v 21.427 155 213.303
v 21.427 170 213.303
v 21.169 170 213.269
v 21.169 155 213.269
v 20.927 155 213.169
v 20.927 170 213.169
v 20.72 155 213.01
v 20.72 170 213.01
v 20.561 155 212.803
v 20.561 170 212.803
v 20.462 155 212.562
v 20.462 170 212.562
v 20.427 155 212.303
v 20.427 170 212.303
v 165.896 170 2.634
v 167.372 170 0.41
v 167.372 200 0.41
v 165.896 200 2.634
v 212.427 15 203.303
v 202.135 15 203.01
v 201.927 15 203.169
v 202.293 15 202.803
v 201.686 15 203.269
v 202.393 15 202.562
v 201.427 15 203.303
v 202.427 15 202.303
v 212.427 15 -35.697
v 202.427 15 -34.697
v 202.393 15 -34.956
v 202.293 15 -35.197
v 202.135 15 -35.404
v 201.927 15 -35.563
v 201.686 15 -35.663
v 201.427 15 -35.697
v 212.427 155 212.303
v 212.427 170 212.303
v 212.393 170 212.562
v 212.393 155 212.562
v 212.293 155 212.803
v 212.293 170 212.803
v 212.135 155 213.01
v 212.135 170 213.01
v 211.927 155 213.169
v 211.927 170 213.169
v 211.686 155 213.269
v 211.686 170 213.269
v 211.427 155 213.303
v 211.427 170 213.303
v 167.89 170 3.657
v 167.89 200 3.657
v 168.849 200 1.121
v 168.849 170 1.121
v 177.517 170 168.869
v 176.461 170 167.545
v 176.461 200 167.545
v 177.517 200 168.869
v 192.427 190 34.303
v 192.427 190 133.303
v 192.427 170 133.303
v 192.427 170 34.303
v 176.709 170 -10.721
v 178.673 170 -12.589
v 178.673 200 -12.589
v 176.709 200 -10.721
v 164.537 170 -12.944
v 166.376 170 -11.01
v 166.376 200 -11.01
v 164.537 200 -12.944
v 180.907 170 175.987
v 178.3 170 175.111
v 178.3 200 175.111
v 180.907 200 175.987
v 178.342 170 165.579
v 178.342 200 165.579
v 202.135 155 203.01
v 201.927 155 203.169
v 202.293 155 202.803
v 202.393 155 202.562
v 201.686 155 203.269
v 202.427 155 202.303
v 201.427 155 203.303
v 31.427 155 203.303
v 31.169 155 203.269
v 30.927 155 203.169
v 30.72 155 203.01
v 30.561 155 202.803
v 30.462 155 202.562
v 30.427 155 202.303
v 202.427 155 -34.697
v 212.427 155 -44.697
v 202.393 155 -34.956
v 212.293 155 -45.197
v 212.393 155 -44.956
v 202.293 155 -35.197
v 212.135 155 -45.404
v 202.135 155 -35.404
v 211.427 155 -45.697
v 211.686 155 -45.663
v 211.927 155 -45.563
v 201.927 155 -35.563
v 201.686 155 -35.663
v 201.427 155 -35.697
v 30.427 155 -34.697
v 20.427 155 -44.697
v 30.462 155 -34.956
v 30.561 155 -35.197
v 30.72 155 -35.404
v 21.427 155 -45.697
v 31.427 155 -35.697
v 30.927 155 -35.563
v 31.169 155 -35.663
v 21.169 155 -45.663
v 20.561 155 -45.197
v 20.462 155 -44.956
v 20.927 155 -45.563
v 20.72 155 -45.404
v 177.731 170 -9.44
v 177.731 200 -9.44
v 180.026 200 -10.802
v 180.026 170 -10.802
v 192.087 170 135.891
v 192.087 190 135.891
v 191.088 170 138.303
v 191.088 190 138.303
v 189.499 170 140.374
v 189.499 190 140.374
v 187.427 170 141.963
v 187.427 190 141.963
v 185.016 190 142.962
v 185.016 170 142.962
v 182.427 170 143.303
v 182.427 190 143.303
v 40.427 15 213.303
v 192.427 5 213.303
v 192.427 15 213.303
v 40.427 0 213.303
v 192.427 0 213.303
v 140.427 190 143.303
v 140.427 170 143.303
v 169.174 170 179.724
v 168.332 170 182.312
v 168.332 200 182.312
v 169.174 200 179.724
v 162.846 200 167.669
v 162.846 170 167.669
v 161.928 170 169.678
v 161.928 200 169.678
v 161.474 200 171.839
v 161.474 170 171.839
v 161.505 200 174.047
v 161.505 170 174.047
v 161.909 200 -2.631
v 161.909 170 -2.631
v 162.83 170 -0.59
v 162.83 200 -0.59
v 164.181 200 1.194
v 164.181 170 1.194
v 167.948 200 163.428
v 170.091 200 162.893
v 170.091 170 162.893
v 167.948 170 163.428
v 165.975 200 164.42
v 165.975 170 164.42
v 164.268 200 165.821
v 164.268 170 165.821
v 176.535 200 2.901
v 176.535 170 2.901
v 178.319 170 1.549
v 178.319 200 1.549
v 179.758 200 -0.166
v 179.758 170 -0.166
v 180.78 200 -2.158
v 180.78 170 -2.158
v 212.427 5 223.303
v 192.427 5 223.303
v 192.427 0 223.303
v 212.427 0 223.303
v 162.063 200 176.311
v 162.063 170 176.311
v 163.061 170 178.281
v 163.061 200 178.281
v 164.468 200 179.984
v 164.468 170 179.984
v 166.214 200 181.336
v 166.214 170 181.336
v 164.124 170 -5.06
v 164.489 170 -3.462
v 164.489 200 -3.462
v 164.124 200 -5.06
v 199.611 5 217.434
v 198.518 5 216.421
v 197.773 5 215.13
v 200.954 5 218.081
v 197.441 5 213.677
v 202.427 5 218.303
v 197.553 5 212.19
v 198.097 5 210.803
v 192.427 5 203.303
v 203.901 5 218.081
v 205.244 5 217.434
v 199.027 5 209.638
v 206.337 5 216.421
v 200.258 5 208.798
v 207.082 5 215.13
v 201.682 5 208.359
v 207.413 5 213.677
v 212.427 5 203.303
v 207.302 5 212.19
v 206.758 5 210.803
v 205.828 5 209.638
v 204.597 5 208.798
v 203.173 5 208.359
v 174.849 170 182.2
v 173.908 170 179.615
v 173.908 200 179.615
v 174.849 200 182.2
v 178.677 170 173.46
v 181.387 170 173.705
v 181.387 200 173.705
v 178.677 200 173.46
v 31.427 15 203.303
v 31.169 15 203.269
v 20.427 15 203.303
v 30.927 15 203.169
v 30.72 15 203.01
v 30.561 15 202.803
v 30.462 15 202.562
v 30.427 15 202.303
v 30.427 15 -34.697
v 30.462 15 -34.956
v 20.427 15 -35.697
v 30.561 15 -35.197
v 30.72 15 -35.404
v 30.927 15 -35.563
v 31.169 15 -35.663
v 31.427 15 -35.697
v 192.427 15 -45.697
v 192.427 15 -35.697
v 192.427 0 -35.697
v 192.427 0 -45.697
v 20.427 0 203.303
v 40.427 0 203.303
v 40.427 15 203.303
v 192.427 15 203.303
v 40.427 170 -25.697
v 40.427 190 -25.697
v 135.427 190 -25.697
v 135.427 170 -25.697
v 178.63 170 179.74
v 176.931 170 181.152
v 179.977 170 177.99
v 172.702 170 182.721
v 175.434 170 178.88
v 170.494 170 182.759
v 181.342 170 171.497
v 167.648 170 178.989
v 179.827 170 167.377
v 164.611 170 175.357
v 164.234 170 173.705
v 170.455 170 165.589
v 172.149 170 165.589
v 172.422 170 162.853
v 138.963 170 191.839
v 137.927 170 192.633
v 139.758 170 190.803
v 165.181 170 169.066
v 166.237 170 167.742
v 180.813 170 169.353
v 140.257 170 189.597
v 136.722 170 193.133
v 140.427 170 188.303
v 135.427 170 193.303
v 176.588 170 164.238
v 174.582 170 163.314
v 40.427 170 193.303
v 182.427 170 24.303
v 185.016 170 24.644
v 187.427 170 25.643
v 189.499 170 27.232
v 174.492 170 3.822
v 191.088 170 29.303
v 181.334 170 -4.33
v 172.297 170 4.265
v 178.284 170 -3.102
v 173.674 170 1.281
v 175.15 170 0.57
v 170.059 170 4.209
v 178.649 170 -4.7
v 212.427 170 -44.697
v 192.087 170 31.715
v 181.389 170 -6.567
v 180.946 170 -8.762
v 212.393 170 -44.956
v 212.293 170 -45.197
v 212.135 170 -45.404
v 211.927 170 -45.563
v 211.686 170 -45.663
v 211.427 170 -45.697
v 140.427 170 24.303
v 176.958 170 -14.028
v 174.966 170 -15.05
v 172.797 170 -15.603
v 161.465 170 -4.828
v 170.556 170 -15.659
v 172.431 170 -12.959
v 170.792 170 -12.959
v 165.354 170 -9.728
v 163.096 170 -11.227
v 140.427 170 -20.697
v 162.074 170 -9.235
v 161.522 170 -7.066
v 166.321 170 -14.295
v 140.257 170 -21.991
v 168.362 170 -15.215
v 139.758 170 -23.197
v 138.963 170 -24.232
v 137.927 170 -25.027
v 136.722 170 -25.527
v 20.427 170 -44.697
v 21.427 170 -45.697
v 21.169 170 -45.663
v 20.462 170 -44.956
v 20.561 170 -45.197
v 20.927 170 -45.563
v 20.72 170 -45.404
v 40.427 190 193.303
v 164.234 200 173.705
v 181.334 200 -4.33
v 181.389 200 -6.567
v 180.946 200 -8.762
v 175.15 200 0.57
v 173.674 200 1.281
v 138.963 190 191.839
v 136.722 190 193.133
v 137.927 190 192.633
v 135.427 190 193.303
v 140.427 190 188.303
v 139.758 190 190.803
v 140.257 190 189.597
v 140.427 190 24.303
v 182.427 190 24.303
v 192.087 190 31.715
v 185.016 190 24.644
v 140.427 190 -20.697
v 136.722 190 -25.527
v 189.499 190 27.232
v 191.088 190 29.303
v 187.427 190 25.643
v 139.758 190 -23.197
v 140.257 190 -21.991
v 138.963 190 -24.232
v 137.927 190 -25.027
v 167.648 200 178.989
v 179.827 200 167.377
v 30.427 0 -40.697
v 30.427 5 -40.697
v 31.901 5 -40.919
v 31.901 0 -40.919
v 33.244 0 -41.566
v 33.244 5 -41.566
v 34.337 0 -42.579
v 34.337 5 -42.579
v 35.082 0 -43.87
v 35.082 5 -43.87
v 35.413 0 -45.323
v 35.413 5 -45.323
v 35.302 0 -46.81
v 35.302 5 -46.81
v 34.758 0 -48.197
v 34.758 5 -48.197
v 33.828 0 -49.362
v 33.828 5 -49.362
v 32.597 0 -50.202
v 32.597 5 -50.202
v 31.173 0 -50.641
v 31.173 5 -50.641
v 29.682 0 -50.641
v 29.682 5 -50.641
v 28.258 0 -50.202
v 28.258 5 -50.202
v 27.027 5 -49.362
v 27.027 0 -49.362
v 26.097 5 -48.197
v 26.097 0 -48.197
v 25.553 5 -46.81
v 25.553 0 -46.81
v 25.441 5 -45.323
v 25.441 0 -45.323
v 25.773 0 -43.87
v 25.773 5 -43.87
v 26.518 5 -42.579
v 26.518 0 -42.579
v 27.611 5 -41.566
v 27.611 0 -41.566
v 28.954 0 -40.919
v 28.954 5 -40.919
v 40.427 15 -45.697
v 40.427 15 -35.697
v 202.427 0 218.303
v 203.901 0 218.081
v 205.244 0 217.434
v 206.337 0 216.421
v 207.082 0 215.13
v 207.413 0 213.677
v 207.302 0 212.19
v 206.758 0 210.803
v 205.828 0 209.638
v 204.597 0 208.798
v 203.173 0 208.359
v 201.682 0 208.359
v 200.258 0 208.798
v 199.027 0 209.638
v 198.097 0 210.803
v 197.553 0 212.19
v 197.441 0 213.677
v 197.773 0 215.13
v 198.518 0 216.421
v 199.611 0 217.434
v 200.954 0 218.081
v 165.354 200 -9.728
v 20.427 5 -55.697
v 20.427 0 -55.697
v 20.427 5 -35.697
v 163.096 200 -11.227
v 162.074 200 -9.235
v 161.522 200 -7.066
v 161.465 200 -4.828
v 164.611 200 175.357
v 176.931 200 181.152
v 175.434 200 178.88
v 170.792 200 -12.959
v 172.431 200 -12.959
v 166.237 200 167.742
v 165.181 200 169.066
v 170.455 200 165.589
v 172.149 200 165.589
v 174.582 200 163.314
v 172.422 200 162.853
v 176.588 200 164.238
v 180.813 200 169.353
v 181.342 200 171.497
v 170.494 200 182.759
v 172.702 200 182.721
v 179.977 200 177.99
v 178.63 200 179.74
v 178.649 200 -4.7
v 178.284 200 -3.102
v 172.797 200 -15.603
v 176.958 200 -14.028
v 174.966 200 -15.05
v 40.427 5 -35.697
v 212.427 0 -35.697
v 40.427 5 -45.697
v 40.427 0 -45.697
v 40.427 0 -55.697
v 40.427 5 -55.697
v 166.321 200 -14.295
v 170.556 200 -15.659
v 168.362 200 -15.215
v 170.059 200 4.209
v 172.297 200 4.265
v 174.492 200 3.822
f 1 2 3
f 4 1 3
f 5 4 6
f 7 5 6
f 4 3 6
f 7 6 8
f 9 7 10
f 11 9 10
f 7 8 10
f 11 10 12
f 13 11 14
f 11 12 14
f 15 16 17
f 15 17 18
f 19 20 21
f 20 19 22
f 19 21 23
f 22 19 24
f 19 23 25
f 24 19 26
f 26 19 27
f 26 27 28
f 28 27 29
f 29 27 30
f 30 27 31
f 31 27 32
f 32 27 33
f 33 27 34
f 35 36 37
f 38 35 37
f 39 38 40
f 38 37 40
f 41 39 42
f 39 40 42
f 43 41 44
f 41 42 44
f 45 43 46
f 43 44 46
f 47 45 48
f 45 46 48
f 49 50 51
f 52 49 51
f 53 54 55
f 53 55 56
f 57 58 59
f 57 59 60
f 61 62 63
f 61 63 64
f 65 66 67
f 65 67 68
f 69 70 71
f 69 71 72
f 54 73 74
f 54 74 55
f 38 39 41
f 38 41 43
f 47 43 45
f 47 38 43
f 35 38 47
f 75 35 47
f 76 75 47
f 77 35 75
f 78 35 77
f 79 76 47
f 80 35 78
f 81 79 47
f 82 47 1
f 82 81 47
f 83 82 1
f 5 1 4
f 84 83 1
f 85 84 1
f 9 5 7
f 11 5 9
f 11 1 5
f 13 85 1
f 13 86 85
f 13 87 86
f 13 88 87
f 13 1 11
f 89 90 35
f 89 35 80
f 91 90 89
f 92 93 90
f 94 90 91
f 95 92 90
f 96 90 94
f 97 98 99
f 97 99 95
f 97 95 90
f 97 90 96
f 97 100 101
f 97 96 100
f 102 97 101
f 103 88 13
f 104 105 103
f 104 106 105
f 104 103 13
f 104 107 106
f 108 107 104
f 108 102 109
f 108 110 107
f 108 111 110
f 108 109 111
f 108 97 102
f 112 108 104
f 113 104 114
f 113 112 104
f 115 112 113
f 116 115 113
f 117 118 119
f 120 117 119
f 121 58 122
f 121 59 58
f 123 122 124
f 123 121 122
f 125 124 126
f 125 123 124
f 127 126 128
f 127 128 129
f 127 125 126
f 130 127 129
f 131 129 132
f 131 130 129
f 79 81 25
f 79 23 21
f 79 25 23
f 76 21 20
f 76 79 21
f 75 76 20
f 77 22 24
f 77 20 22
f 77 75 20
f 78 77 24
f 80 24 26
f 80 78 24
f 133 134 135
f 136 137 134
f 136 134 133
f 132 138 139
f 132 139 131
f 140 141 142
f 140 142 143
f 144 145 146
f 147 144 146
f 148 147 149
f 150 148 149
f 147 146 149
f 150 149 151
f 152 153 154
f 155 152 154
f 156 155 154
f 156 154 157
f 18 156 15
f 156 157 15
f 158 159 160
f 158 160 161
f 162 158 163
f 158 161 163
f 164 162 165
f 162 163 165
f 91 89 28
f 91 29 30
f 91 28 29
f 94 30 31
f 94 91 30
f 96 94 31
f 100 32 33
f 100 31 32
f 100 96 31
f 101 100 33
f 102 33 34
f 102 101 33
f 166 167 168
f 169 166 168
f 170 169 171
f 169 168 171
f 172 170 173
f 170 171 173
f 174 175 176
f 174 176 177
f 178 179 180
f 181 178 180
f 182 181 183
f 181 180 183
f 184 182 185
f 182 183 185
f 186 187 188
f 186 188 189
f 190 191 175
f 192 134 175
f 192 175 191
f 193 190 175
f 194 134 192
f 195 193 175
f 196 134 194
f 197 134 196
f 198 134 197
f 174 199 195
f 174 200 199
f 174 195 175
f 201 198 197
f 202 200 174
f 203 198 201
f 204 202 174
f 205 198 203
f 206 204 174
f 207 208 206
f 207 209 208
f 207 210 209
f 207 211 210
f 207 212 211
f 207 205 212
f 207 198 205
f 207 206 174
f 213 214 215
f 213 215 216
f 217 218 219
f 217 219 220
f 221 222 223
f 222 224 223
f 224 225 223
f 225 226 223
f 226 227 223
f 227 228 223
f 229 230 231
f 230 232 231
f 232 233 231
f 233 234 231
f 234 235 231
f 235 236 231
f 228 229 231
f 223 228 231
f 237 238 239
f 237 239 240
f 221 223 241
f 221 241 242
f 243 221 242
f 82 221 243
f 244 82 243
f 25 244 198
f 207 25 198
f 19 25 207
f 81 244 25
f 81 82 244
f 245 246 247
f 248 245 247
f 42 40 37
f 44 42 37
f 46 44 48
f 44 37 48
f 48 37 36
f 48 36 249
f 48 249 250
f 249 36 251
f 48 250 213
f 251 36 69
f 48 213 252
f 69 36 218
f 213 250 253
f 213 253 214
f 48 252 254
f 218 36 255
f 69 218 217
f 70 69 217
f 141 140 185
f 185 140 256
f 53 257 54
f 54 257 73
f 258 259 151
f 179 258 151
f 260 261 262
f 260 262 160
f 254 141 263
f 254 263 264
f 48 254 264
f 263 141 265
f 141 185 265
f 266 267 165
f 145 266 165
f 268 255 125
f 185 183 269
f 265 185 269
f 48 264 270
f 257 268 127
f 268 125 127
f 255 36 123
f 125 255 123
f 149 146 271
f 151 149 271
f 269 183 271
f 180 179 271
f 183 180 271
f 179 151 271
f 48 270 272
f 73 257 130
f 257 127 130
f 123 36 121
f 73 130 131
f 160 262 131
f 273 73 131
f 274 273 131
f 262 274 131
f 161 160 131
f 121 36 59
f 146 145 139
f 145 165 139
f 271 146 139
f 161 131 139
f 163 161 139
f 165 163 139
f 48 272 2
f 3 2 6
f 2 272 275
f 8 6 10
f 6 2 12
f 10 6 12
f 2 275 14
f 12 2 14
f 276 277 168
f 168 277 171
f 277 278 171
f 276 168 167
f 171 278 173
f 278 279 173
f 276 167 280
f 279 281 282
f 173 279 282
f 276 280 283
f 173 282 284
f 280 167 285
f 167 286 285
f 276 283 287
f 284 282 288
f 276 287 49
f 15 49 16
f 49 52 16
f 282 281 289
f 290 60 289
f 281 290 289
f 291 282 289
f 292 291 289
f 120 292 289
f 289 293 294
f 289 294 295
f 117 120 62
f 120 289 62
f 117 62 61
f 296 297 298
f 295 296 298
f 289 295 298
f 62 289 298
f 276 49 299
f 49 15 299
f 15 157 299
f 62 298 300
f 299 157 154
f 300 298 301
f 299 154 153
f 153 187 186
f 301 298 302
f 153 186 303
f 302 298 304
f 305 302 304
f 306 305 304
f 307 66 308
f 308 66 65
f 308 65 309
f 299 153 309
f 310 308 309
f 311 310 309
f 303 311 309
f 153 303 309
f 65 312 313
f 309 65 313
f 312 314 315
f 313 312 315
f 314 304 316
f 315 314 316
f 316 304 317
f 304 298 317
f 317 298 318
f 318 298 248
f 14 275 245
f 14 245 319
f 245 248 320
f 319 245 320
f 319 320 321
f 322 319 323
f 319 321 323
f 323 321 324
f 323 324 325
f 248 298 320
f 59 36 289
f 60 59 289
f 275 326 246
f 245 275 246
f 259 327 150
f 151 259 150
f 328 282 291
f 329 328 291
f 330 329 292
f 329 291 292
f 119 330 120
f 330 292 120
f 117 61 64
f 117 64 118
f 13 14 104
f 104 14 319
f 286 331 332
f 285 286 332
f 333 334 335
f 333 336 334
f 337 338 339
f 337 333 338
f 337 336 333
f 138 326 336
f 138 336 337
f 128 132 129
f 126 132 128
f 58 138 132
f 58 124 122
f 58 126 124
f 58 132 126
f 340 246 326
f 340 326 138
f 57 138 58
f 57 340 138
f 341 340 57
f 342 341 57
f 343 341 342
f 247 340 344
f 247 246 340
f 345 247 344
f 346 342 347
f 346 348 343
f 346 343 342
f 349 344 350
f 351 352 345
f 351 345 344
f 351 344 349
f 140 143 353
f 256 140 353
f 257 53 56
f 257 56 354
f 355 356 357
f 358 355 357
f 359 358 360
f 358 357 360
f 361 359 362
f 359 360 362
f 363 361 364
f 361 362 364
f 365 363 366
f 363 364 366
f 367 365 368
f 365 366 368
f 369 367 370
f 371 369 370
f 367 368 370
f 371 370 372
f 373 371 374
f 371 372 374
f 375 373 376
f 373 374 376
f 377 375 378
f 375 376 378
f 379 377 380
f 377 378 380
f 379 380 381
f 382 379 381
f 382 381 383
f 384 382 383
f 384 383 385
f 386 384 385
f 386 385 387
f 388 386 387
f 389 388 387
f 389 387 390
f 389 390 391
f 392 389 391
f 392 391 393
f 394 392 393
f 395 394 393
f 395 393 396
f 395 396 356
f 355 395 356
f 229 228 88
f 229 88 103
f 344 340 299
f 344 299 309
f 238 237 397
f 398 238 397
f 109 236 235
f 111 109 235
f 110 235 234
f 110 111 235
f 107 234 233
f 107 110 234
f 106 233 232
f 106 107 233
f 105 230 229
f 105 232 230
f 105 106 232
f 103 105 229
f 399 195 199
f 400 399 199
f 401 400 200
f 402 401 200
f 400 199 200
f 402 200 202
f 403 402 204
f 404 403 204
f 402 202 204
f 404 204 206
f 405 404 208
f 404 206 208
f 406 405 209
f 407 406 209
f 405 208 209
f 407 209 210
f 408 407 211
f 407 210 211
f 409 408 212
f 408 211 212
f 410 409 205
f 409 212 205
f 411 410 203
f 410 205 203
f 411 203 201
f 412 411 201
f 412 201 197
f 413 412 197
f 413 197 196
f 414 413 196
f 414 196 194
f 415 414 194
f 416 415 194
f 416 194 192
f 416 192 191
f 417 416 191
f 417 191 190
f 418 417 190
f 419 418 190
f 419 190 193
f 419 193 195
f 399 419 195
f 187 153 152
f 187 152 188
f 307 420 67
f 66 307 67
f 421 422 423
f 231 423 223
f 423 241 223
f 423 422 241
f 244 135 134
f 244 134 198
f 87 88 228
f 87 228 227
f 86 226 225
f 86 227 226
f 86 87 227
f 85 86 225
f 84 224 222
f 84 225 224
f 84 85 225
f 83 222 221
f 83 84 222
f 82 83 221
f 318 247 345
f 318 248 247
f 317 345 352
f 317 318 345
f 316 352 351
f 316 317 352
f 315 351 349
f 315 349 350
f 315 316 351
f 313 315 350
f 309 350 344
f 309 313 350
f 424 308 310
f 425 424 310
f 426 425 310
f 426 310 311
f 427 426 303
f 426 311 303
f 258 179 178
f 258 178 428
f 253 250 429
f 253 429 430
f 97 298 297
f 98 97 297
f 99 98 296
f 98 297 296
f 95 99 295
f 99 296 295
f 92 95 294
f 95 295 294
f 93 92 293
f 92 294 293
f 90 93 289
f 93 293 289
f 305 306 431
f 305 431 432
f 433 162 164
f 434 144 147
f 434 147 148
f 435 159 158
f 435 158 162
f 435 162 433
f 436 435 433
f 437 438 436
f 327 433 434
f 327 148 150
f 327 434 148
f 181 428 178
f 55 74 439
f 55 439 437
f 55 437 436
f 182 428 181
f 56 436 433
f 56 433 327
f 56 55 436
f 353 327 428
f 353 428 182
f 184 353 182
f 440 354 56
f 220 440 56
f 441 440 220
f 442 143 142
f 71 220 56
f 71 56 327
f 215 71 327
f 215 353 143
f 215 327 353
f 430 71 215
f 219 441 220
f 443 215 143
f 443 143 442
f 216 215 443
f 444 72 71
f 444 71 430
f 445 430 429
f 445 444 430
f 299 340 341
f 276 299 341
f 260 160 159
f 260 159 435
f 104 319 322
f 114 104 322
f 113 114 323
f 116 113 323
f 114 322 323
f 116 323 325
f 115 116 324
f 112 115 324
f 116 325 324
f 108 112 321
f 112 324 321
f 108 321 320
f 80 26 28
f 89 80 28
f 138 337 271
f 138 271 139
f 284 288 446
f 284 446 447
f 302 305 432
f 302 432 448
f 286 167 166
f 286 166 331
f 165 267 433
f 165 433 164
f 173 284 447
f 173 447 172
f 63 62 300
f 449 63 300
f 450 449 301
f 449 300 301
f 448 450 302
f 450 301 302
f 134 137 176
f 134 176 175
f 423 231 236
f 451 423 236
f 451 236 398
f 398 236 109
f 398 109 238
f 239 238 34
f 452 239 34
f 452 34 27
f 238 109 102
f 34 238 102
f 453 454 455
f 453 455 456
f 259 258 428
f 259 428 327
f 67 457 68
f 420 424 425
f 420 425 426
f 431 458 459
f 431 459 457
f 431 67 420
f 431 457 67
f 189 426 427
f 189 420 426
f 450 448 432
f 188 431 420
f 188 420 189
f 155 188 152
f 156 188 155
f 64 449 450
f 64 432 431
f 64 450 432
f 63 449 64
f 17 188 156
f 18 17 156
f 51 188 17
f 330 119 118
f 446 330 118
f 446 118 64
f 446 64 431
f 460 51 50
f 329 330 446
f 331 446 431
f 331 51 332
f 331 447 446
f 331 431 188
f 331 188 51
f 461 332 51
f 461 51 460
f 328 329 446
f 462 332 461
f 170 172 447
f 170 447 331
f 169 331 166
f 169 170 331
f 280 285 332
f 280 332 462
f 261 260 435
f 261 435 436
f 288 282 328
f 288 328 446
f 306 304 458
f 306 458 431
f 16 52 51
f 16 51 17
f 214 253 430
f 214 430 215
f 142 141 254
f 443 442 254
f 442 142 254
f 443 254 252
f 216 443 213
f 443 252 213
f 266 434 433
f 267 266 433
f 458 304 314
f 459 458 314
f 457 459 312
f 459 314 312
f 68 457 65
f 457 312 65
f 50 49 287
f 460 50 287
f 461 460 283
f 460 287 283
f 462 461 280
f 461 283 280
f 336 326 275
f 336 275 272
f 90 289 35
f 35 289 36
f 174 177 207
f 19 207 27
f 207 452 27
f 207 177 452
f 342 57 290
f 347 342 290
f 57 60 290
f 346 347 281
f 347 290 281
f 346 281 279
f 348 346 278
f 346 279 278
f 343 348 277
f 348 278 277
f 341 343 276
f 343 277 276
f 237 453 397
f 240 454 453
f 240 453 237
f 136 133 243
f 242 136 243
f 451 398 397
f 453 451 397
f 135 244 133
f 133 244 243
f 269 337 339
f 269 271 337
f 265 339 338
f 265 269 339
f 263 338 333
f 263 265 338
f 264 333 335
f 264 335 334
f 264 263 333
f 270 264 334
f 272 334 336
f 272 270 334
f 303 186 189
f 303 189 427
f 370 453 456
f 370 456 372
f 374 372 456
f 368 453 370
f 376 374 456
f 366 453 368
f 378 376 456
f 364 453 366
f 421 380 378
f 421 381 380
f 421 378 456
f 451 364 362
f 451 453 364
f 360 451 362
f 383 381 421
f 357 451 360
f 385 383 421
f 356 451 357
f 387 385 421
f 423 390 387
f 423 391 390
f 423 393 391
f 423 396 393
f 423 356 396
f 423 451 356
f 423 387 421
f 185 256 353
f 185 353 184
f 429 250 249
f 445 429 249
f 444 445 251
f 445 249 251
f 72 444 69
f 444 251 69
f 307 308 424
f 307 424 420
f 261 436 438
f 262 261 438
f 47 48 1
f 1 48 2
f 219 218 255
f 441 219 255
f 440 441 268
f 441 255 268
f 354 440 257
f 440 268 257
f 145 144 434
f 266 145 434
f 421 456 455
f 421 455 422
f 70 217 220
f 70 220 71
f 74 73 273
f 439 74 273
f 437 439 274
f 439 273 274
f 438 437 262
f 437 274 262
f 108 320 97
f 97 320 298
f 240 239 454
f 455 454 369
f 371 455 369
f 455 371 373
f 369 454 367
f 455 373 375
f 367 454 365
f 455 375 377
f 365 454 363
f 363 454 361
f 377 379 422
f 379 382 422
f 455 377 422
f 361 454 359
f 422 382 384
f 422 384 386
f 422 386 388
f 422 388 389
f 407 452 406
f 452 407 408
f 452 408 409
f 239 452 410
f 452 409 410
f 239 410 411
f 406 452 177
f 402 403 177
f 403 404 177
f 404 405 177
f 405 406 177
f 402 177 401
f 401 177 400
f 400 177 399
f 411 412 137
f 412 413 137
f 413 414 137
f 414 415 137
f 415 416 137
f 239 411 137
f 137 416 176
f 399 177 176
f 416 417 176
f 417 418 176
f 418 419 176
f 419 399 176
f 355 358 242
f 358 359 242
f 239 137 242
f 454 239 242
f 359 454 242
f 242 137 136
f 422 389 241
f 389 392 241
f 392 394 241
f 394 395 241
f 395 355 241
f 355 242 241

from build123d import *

# Parameters (mm, degrees)
SKETCH1_W           = 172
SKETCH1_H           = 239
BOSS_EXTRUDE1_DEPTH = 190
SKETCH2_W           = 172
SKETCH2_H           = 239
SKETCH2_W_2         = 152
SKETCH2_H_2         = 219
CUT_EXTRUDE1_DEPTH  = 20
SKETCH3_W           = 52
SKETCH3_H           = 50
CUT_EXTRUDE2_DEPTH  = 20
FILLET1_R           = 10
FILLET2_R           = 10
FILLET3_R           = 5
FILLET4_R           = 5
FILLET6_R           = 1
FILLET7_R           = 1
FILLET8_R           = 1
FILLET9_R           = 1
SKETCH4_R           = 10
BOSS_EXTRUDE4_DEPTH = 30
CUT_EXTRUDE8_START  = -30
CUT_EXTRUDE8_DEPTH  = 30
CUT_EXTRUDE9_START  = -30
CUT_EXTRUDE9_DEPTH  = 30
BOSS_EXTRUDE5_DEPTH = 15
SKETCH11_W          = 20
SKETCH11_H          = 10
CUT_EXTRUDE11_DEPTH = 15
SKETCH12_W          = 20
SKETCH12_H          = 5
BOSS_EXTRUDE6_DEPTH = 20
SKETCH13_R          = 5
CUT_EXTRUDE12_DEPTH = 20
SKETCH14_W          = 20
SKETCH14_H          = 5
BOSS_EXTRUDE7_DEPTH = 20
SKETCH15_R          = 5
CUT_EXTRUDE13_DEPTH = 20


with BuildPart() as part:
    # Sketch1 → Boss-Extrude1 (new body)
    with BuildSketch(Plane(origin=(0, 0, 0), x_dir=(1, 0, 0), z_dir=(0, 1, 0))):
        with Locations((116.427433091, -83.803086818)):
            Rectangle(SKETCH1_W, SKETCH1_H)
    extrude(amount=BOSS_EXTRUDE1_DEPTH)

    # Sketch2 → Cut-Extrude1 (cut)
    with BuildSketch(Plane(origin=(0, 190, 0), x_dir=(1, 0, 0), z_dir=(0, 1, 0))):
        with Locations((116.427433091, -83.803086818)):
            Rectangle(SKETCH2_W, SKETCH2_H)
        with Locations((116.427433091, -83.803086818)):
            Rectangle(SKETCH2_W_2, SKETCH2_H_2, mode=Mode.SUBTRACT)
    extrude(amount=-CUT_EXTRUDE1_DEPTH, mode=Mode.SUBTRACT)

    # Sketch3 → Cut-Extrude2 (cut)
    with BuildSketch(Plane(origin=(0, 190, 0), x_dir=(1, 0, 0), z_dir=(0, 1, 0))):
        with Locations((166.427433091, 0.696913182)):
            Rectangle(SKETCH3_W, SKETCH3_H)
        with Locations((166.427433091, -168.303086818)):
            Rectangle(SKETCH3_W, SKETCH3_H)
    extrude(amount=-CUT_EXTRUDE2_DEPTH, mode=Mode.SUBTRACT)

    # Fillet1
    fillet1_edges = [part.edges().sort_by_distance(p)[0] for p in [
        (192.427433091, 180, 24.303086818),
    ]]
    fillet(fillet1_edges, radius=FILLET1_R)

    # Fillet2
    fillet2_edges = [part.edges().sort_by_distance(p)[0] for p in [
        (192.427433091, 180, 143.303086818),
    ]]
    fillet(fillet2_edges, radius=FILLET2_R)

    # Fillet3
    fillet3_edges = [part.edges().sort_by_distance(p)[0] for p in [
        (140.427433091, 180, 193.303086818),
    ]]
    fillet(fillet3_edges, radius=FILLET3_R)

    # Fillet4
    fillet4_edges = [part.edges().sort_by_distance(p)[0] for p in [
        (140.427433091, 180, -25.696913182),
    ]]
    fillet(fillet4_edges, radius=FILLET4_R)

    # Fillet6
    fillet6_edges = [part.edges().sort_by_distance(p)[0] for p in [
        (30.427433091, 85, 203.303086818),
    ]]
    fillet(fillet6_edges, radius=FILLET6_R)

    # Fillet7
    fillet7_edges = [part.edges().sort_by_distance(p)[0] for p in [
        (202.427433091, 85, 203.303086818),
    ]]
    fillet(fillet7_edges, radius=FILLET7_R)

    # Fillet8
    fillet8_edges = [part.edges().sort_by_distance(p)[0] for p in [
        (202.427433091, 85, -35.696913182),
    ]]
    fillet(fillet8_edges, radius=FILLET8_R)

    # Fillet9
    fillet9_edges = [part.edges().sort_by_distance(p)[0] for p in [
        (30.427433091, 85, -35.696913182),
    ]]
    fillet(fillet9_edges, radius=FILLET9_R)

    # Sketch4 → Boss-Extrude4 (add)
    with BuildSketch(Plane(origin=(0, 170, 0), x_dir=(1, 0, 0), z_dir=(0, 1, 0))):
        with Locations(Location((171.427433091, -172.803086818, 0), (0, 0, 270))):
            Circle(SKETCH4_R)
        with Locations(Location((171.427433091, 5.696913182, 0), (0, 0, 270))):
            Circle(SKETCH4_R)
    extrude(amount=BOSS_EXTRUDE4_DEPTH)

    # Sketch7 → Cut-Extrude8 (cut)
    with BuildSketch(Plane(origin=(0, 200, 0), x_dir=(1, 0, 0), z_dir=(0, 1, 0)).offset(CUT_EXTRUDE8_START)):
        with BuildLine():
            Line((166.237215884, -167.741646234), (164.26810659, -165.821393323))
            ThreePointArc((164.26810659, -165.821393323), (163.503030714, -166.703591185), (162.846013112, -167.668962633))
            Line((162.846013112, -167.668962633), (165.181081901, -169.06599636))
            Line((165.181081901, -169.06599636), (166.237215884, -167.741646234))
        make_face()
        with BuildLine():
            Line((164.234191998, -173.705205444), (161.505158254, -174.047458976))
            ThreePointArc((161.505158254, -174.047458976), (161.71787131, -175.195660752), (162.062985325, -176.31123705))
            Line((162.062985325, -176.31123705), (164.611121852, -175.35664304))
            Line((164.611121852, -175.35664304), (164.234191998, -173.705205444))
        make_face()
        with BuildLine():
            Line((167.647825369, -178.989450929), (166.213885247, -181.336487013))
            ThreePointArc((166.213885247, -181.336487013), (167.244209965, -181.886073347), (168.331577706, -182.31180279))
            Line((168.331577706, -182.31180279), (169.173983194, -179.724409801))
            Line((169.173983194, -179.724409801), (167.647825369, -178.989450929))
        make_face()
        with BuildLine():
            ThreePointArc((174.848520104, -182.199690654), (175.920600956, -181.736811827), (176.931412335, -181.15211146))
            Line((176.931412335, -181.15211146), (175.433738269, -178.880279187))
            Line((175.433738269, -178.880279187), (173.907580445, -179.61523806))
            Line((173.907580445, -179.61523806), (174.848520104, -182.199690654))
        make_face()
        with BuildLine():
            ThreePointArc((180.907006662, -175.987059951), (181.2135449, -174.86027316), (181.386638332, -173.705434286))
            Line((181.386638332, -173.705434286), (178.676663832, -173.459898767))
            Line((178.676663832, -173.459898767), (178.299733977, -175.111336363))
            Line((178.299733977, -175.111336363), (180.907006662, -175.987059951))
        make_face()
        with BuildLine():
            ThreePointArc((179.827180973, -167.376832537), (179.137347052, -166.434631219), (178.342379652, -165.579271064))
            Line((178.342379652, -165.579271064), (176.460770789, -167.544925553))
            Line((176.460770789, -167.544925553), (177.516904772, -168.869275679))
            Line((177.516904772, -168.869275679), (179.827180973, -167.376832537))
        make_face()
        with BuildLine():
            ThreePointArc((172.422173805, -162.852685273), (171.255426737, -162.804566237), (170.091025172, -162.892788443))
            Line((170.091025172, -162.892788443), (170.454671798, -165.589455018))
            Line((170.454671798, -165.589455018), (172.148579189, -165.589455018))
            Line((172.148579189, -165.589455018), (172.422173805, -162.852685273))
        make_face()
    extrude(amount=CUT_EXTRUDE8_DEPTH, mode=Mode.SUBTRACT)

    # Sketch8 → Cut-Extrude9 (cut)
    with BuildSketch(Plane(origin=(0, 200, 0), x_dir=(1, 0, 0), z_dir=(0, 1, 0)).offset(CUT_EXTRUDE9_START)):
        with BuildLine():
            Line((166.375783325, 11.009561317), (164.536616638, 12.943750328))
            ThreePointArc((164.536616638, 12.943750328), (163.767883793, 12.125855906), (163.095653722, 11.226963141))
            Line((163.095653722, 11.226963141), (165.353867519, 9.728119429))
            Line((165.353867519, 9.728119429), (166.375783325, 11.009561317))
        make_face()
        with BuildLine():
            ThreePointArc((172.796884735, 15.60269948), (171.678132038, 15.69377019), (170.55622078, 15.658890351))
            Line((170.55622078, 15.658890351), (170.792350852, 12.95883394))
            Line((170.792350852, 12.95883394), (172.431376546, 12.95883394))
            Line((172.431376546, 12.95883394), (172.796884735, 15.60269948))
        make_face()
        with BuildLine():
            ThreePointArc((180.025927812, 10.802389509), (179.399598862, 11.733847248), (178.672828478, 12.589245565))
            Line((178.672828478, 12.589245565), (176.709064064, 10.721174005))
            Line((176.709064064, 10.721174005), (177.730979869, 9.439732117))
            Line((177.730979869, 9.439732117), (180.025927812, 10.802389509))
        make_face()
        with BuildLine():
            ThreePointArc((180.780128986, 2.15755173), (181.117862258, 3.227989823), (181.33350567, 4.329533917))
            Line((181.33350567, 4.329533917), (178.648601427, 4.700143193))
            Line((178.648601427, 4.700143193), (178.283883899, 3.102211295))
            Line((178.283883899, 3.102211295), (180.780128986, 2.15755173))
        make_face()
        with BuildLine():
            Line((164.124185412, 5.059756289), (161.465273877, 4.827784996))
            ThreePointArc((161.465273877, 4.827784996), (161.625432396, 3.716816625), (161.909086465, 2.63079552))
            Line((161.909086465, 2.63079552), (164.48890294, 3.461824392))
            Line((164.48890294, 3.461824392), (164.124185412, 5.059756289))
        make_face()
        with BuildLine():
            Line((167.37208196, -0.410256602), (165.895640195, -2.633709085))
            ThreePointArc((165.895640195, -2.633709085), (166.864087446, -3.201169563), (167.890028356, -3.656522965))
            Line((167.890028356, -3.656522965), (168.848793084, -1.121403199))
            Line((168.848793084, -1.121403199), (167.37208196, -0.410256602))
        make_face()
        with BuildLine():
            ThreePointArc((174.491559391, -3.822074685), (175.539034842, -3.418717956), (176.534708162, -2.900513255))
            Line((176.534708162, -2.900513255), (175.150451748, -0.570299486))
            Line((175.150451748, -0.570299486), (173.673740624, -1.281446083))
            Line((173.673740624, -1.281446083), (174.491559391, -3.822074685))
        make_face()
    extrude(amount=CUT_EXTRUDE9_DEPTH, mode=Mode.SUBTRACT)

    # Sketch9 → Boss-Extrude5 (add)
    with BuildSketch(Plane(origin=(0, 170, 0), x_dir=(1, 0, 0), z_dir=(0, 1, 0))):
        with BuildLine():
            Line((21.427433091, 45.696913182), (211.427433091, 45.696913182))
            ThreePointArc((211.427433091, 45.696913182), (212.134539872, 45.404019963), (212.427433091, 44.696913182))
            Line((212.427433091, 44.696913182), (212.427433091, -212.303086818))
            ThreePointArc((212.427433091, -212.303086818), (212.134539872, -213.010193599), (211.427433091, -213.303086818))
            Line((211.427433091, -213.303086818), (21.427433091, -213.303086818))
            ThreePointArc((21.427433091, -213.303086818), (20.720326309, -213.010193599), (20.427433091, -212.303086818))
            Line((20.427433091, -212.303086818), (20.427433091, 44.696913182))
            ThreePointArc((20.427433091, 44.696913182), (20.720326309, 45.404019963), (21.427433091, 45.696913182))
        make_face()
        with BuildLine():
            Line((31.427433091, 35.696913182), (201.427433091, 35.696913182))
            ThreePointArc((201.427433091, 35.696913182), (202.134539872, 35.404019963), (202.427433091, 34.696913182))
            Line((202.427433091, 34.696913182), (202.427433091, -202.303086818))
            ThreePointArc((202.427433091, -202.303086818), (202.134539872, -203.010193599), (201.427433091, -203.303086818))
            Line((201.427433091, -203.303086818), (31.427433091, -203.303086818))
            ThreePointArc((31.427433091, -203.303086818), (30.720326309, -203.010193599), (30.427433091, -202.303086818))
            Line((30.427433091, -202.303086818), (30.427433091, 34.696913182))
            ThreePointArc((30.427433091, 34.696913182), (30.720326309, 35.404019963), (31.427433091, 35.696913182))
        make_face(mode=Mode.SUBTRACT)
    boss_extrude5 = extrude(amount=-BOSS_EXTRUDE5_DEPTH)

    # Mirror2: Boss-Extrude5 across plane
    add(boss_extrude5.mirror(Plane.ZX.offset(85)))

    # Sketch11 → Cut-Extrude11 (cut)
    with BuildSketch(Plane(origin=(0, 15, 0), x_dir=(1, 0, 0), z_dir=(0, 1, 0))):
        with Locations((30.427433091, -208.303086818)):
            Rectangle(SKETCH11_W, SKETCH11_H)
        with Locations((202.427433091, -208.303086818)):
            Rectangle(SKETCH11_W, SKETCH11_H)
        with Locations((202.427433091, 40.696913182)):
            Rectangle(SKETCH11_W, SKETCH11_H)
        with Locations((30.427433091, 40.696913182)):
            Rectangle(SKETCH11_W, SKETCH11_H)
    extrude(amount=-CUT_EXTRUDE11_DEPTH, mode=Mode.SUBTRACT)

    # Sketch12 → Boss-Extrude6 (add)
    with BuildSketch(Plane.XY.offset(203.303086818)):
        with Locations((202.427433091, 2.5)):
            Rectangle(SKETCH12_W, SKETCH12_H)
    extrude(amount=BOSS_EXTRUDE6_DEPTH)

    # Sketch13 → Cut-Extrude12 (cut)
    with BuildSketch(Plane(origin=(0, 5, 0), x_dir=(1, 0, 0), z_dir=(0, 1, 0))):
        with Locations(Location((202.427433091, -213.303086818, 0), (0, 0, 270))):
            Circle(SKETCH13_R)
    extrude(amount=-CUT_EXTRUDE12_DEPTH, mode=Mode.SUBTRACT)

    # Sketch14 → Boss-Extrude7 (add)
    with BuildSketch(Plane(origin=(0, 0, -35.696913182), x_dir=(-1, 0, 0), z_dir=(0, 0, -1))):
        with Locations((-30.427433091, 2.5)):
            Rectangle(SKETCH14_W, SKETCH14_H)
    extrude(amount=BOSS_EXTRUDE7_DEPTH)

    # Sketch15 → Cut-Extrude13 (cut)
    with BuildSketch(Plane(origin=(0, 5, 0), x_dir=(1, 0, 0), z_dir=(0, 1, 0))):
        with Locations(Location((30.427433091, 45.696913182, 0), (0, 0, 270))):
            Circle(SKETCH15_R)
    extrude(amount=-CUT_EXTRUDE13_DEPTH, mode=Mode.SUBTRACT)


solid = part.part
